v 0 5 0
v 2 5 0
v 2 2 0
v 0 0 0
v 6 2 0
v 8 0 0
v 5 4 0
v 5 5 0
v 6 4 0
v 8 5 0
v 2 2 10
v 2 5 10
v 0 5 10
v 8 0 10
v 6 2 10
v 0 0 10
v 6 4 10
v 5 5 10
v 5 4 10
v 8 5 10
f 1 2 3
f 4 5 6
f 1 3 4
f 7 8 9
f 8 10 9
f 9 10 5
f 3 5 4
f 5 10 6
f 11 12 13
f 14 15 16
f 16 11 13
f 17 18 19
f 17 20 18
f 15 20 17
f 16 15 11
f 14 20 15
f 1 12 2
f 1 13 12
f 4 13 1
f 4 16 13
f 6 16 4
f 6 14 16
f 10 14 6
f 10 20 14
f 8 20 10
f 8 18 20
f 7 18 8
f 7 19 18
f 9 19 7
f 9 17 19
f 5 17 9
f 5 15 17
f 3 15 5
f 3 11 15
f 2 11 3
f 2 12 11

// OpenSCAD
$fn=50;
D=3.45;
H=15;
G=18;
lw=45;

X=3;
Y=4;

label();
translate([+14,-4,13])rotate([0,-90]) !clip();

module clip() {
    a=4;
    linear_extrude(10)
    difference() {
        square([a*2,5]);
        translate([a/2,2]) square([a,2.0]);
        translate([a/2,2]) square([3,6]);
    }
    
}

module label() {

    union() {
        for(x=[0:X-1],y=[0:Y-1]) translate([x*G,y*G])
        union() hull() {  
            cylinder(h=H+2,d=D);
            rotate([45,0]) cube([0.1,2,2],center=true);
        }
            
        translate([0,0,H])
        linear_extrude(2)
        offset(D/2) square([G*(X-1),G*(Y-1)]);
    }
        
    translate([0,0,H+2.1])
    difference() {
        linear_extrude(2)
        offset(D/2) square([G*(X-1),G*(Y-1)]);
        
        linear_extrude(5,center=true)
        offset(delta=0.5) square([G*(X-1),G*(Y-1)]);
        
        translate([-5/2,G*(Y-1)/2-lw/2,-4.7]) cube([G*(X-1)+lw,lw,5]);
    }

}
